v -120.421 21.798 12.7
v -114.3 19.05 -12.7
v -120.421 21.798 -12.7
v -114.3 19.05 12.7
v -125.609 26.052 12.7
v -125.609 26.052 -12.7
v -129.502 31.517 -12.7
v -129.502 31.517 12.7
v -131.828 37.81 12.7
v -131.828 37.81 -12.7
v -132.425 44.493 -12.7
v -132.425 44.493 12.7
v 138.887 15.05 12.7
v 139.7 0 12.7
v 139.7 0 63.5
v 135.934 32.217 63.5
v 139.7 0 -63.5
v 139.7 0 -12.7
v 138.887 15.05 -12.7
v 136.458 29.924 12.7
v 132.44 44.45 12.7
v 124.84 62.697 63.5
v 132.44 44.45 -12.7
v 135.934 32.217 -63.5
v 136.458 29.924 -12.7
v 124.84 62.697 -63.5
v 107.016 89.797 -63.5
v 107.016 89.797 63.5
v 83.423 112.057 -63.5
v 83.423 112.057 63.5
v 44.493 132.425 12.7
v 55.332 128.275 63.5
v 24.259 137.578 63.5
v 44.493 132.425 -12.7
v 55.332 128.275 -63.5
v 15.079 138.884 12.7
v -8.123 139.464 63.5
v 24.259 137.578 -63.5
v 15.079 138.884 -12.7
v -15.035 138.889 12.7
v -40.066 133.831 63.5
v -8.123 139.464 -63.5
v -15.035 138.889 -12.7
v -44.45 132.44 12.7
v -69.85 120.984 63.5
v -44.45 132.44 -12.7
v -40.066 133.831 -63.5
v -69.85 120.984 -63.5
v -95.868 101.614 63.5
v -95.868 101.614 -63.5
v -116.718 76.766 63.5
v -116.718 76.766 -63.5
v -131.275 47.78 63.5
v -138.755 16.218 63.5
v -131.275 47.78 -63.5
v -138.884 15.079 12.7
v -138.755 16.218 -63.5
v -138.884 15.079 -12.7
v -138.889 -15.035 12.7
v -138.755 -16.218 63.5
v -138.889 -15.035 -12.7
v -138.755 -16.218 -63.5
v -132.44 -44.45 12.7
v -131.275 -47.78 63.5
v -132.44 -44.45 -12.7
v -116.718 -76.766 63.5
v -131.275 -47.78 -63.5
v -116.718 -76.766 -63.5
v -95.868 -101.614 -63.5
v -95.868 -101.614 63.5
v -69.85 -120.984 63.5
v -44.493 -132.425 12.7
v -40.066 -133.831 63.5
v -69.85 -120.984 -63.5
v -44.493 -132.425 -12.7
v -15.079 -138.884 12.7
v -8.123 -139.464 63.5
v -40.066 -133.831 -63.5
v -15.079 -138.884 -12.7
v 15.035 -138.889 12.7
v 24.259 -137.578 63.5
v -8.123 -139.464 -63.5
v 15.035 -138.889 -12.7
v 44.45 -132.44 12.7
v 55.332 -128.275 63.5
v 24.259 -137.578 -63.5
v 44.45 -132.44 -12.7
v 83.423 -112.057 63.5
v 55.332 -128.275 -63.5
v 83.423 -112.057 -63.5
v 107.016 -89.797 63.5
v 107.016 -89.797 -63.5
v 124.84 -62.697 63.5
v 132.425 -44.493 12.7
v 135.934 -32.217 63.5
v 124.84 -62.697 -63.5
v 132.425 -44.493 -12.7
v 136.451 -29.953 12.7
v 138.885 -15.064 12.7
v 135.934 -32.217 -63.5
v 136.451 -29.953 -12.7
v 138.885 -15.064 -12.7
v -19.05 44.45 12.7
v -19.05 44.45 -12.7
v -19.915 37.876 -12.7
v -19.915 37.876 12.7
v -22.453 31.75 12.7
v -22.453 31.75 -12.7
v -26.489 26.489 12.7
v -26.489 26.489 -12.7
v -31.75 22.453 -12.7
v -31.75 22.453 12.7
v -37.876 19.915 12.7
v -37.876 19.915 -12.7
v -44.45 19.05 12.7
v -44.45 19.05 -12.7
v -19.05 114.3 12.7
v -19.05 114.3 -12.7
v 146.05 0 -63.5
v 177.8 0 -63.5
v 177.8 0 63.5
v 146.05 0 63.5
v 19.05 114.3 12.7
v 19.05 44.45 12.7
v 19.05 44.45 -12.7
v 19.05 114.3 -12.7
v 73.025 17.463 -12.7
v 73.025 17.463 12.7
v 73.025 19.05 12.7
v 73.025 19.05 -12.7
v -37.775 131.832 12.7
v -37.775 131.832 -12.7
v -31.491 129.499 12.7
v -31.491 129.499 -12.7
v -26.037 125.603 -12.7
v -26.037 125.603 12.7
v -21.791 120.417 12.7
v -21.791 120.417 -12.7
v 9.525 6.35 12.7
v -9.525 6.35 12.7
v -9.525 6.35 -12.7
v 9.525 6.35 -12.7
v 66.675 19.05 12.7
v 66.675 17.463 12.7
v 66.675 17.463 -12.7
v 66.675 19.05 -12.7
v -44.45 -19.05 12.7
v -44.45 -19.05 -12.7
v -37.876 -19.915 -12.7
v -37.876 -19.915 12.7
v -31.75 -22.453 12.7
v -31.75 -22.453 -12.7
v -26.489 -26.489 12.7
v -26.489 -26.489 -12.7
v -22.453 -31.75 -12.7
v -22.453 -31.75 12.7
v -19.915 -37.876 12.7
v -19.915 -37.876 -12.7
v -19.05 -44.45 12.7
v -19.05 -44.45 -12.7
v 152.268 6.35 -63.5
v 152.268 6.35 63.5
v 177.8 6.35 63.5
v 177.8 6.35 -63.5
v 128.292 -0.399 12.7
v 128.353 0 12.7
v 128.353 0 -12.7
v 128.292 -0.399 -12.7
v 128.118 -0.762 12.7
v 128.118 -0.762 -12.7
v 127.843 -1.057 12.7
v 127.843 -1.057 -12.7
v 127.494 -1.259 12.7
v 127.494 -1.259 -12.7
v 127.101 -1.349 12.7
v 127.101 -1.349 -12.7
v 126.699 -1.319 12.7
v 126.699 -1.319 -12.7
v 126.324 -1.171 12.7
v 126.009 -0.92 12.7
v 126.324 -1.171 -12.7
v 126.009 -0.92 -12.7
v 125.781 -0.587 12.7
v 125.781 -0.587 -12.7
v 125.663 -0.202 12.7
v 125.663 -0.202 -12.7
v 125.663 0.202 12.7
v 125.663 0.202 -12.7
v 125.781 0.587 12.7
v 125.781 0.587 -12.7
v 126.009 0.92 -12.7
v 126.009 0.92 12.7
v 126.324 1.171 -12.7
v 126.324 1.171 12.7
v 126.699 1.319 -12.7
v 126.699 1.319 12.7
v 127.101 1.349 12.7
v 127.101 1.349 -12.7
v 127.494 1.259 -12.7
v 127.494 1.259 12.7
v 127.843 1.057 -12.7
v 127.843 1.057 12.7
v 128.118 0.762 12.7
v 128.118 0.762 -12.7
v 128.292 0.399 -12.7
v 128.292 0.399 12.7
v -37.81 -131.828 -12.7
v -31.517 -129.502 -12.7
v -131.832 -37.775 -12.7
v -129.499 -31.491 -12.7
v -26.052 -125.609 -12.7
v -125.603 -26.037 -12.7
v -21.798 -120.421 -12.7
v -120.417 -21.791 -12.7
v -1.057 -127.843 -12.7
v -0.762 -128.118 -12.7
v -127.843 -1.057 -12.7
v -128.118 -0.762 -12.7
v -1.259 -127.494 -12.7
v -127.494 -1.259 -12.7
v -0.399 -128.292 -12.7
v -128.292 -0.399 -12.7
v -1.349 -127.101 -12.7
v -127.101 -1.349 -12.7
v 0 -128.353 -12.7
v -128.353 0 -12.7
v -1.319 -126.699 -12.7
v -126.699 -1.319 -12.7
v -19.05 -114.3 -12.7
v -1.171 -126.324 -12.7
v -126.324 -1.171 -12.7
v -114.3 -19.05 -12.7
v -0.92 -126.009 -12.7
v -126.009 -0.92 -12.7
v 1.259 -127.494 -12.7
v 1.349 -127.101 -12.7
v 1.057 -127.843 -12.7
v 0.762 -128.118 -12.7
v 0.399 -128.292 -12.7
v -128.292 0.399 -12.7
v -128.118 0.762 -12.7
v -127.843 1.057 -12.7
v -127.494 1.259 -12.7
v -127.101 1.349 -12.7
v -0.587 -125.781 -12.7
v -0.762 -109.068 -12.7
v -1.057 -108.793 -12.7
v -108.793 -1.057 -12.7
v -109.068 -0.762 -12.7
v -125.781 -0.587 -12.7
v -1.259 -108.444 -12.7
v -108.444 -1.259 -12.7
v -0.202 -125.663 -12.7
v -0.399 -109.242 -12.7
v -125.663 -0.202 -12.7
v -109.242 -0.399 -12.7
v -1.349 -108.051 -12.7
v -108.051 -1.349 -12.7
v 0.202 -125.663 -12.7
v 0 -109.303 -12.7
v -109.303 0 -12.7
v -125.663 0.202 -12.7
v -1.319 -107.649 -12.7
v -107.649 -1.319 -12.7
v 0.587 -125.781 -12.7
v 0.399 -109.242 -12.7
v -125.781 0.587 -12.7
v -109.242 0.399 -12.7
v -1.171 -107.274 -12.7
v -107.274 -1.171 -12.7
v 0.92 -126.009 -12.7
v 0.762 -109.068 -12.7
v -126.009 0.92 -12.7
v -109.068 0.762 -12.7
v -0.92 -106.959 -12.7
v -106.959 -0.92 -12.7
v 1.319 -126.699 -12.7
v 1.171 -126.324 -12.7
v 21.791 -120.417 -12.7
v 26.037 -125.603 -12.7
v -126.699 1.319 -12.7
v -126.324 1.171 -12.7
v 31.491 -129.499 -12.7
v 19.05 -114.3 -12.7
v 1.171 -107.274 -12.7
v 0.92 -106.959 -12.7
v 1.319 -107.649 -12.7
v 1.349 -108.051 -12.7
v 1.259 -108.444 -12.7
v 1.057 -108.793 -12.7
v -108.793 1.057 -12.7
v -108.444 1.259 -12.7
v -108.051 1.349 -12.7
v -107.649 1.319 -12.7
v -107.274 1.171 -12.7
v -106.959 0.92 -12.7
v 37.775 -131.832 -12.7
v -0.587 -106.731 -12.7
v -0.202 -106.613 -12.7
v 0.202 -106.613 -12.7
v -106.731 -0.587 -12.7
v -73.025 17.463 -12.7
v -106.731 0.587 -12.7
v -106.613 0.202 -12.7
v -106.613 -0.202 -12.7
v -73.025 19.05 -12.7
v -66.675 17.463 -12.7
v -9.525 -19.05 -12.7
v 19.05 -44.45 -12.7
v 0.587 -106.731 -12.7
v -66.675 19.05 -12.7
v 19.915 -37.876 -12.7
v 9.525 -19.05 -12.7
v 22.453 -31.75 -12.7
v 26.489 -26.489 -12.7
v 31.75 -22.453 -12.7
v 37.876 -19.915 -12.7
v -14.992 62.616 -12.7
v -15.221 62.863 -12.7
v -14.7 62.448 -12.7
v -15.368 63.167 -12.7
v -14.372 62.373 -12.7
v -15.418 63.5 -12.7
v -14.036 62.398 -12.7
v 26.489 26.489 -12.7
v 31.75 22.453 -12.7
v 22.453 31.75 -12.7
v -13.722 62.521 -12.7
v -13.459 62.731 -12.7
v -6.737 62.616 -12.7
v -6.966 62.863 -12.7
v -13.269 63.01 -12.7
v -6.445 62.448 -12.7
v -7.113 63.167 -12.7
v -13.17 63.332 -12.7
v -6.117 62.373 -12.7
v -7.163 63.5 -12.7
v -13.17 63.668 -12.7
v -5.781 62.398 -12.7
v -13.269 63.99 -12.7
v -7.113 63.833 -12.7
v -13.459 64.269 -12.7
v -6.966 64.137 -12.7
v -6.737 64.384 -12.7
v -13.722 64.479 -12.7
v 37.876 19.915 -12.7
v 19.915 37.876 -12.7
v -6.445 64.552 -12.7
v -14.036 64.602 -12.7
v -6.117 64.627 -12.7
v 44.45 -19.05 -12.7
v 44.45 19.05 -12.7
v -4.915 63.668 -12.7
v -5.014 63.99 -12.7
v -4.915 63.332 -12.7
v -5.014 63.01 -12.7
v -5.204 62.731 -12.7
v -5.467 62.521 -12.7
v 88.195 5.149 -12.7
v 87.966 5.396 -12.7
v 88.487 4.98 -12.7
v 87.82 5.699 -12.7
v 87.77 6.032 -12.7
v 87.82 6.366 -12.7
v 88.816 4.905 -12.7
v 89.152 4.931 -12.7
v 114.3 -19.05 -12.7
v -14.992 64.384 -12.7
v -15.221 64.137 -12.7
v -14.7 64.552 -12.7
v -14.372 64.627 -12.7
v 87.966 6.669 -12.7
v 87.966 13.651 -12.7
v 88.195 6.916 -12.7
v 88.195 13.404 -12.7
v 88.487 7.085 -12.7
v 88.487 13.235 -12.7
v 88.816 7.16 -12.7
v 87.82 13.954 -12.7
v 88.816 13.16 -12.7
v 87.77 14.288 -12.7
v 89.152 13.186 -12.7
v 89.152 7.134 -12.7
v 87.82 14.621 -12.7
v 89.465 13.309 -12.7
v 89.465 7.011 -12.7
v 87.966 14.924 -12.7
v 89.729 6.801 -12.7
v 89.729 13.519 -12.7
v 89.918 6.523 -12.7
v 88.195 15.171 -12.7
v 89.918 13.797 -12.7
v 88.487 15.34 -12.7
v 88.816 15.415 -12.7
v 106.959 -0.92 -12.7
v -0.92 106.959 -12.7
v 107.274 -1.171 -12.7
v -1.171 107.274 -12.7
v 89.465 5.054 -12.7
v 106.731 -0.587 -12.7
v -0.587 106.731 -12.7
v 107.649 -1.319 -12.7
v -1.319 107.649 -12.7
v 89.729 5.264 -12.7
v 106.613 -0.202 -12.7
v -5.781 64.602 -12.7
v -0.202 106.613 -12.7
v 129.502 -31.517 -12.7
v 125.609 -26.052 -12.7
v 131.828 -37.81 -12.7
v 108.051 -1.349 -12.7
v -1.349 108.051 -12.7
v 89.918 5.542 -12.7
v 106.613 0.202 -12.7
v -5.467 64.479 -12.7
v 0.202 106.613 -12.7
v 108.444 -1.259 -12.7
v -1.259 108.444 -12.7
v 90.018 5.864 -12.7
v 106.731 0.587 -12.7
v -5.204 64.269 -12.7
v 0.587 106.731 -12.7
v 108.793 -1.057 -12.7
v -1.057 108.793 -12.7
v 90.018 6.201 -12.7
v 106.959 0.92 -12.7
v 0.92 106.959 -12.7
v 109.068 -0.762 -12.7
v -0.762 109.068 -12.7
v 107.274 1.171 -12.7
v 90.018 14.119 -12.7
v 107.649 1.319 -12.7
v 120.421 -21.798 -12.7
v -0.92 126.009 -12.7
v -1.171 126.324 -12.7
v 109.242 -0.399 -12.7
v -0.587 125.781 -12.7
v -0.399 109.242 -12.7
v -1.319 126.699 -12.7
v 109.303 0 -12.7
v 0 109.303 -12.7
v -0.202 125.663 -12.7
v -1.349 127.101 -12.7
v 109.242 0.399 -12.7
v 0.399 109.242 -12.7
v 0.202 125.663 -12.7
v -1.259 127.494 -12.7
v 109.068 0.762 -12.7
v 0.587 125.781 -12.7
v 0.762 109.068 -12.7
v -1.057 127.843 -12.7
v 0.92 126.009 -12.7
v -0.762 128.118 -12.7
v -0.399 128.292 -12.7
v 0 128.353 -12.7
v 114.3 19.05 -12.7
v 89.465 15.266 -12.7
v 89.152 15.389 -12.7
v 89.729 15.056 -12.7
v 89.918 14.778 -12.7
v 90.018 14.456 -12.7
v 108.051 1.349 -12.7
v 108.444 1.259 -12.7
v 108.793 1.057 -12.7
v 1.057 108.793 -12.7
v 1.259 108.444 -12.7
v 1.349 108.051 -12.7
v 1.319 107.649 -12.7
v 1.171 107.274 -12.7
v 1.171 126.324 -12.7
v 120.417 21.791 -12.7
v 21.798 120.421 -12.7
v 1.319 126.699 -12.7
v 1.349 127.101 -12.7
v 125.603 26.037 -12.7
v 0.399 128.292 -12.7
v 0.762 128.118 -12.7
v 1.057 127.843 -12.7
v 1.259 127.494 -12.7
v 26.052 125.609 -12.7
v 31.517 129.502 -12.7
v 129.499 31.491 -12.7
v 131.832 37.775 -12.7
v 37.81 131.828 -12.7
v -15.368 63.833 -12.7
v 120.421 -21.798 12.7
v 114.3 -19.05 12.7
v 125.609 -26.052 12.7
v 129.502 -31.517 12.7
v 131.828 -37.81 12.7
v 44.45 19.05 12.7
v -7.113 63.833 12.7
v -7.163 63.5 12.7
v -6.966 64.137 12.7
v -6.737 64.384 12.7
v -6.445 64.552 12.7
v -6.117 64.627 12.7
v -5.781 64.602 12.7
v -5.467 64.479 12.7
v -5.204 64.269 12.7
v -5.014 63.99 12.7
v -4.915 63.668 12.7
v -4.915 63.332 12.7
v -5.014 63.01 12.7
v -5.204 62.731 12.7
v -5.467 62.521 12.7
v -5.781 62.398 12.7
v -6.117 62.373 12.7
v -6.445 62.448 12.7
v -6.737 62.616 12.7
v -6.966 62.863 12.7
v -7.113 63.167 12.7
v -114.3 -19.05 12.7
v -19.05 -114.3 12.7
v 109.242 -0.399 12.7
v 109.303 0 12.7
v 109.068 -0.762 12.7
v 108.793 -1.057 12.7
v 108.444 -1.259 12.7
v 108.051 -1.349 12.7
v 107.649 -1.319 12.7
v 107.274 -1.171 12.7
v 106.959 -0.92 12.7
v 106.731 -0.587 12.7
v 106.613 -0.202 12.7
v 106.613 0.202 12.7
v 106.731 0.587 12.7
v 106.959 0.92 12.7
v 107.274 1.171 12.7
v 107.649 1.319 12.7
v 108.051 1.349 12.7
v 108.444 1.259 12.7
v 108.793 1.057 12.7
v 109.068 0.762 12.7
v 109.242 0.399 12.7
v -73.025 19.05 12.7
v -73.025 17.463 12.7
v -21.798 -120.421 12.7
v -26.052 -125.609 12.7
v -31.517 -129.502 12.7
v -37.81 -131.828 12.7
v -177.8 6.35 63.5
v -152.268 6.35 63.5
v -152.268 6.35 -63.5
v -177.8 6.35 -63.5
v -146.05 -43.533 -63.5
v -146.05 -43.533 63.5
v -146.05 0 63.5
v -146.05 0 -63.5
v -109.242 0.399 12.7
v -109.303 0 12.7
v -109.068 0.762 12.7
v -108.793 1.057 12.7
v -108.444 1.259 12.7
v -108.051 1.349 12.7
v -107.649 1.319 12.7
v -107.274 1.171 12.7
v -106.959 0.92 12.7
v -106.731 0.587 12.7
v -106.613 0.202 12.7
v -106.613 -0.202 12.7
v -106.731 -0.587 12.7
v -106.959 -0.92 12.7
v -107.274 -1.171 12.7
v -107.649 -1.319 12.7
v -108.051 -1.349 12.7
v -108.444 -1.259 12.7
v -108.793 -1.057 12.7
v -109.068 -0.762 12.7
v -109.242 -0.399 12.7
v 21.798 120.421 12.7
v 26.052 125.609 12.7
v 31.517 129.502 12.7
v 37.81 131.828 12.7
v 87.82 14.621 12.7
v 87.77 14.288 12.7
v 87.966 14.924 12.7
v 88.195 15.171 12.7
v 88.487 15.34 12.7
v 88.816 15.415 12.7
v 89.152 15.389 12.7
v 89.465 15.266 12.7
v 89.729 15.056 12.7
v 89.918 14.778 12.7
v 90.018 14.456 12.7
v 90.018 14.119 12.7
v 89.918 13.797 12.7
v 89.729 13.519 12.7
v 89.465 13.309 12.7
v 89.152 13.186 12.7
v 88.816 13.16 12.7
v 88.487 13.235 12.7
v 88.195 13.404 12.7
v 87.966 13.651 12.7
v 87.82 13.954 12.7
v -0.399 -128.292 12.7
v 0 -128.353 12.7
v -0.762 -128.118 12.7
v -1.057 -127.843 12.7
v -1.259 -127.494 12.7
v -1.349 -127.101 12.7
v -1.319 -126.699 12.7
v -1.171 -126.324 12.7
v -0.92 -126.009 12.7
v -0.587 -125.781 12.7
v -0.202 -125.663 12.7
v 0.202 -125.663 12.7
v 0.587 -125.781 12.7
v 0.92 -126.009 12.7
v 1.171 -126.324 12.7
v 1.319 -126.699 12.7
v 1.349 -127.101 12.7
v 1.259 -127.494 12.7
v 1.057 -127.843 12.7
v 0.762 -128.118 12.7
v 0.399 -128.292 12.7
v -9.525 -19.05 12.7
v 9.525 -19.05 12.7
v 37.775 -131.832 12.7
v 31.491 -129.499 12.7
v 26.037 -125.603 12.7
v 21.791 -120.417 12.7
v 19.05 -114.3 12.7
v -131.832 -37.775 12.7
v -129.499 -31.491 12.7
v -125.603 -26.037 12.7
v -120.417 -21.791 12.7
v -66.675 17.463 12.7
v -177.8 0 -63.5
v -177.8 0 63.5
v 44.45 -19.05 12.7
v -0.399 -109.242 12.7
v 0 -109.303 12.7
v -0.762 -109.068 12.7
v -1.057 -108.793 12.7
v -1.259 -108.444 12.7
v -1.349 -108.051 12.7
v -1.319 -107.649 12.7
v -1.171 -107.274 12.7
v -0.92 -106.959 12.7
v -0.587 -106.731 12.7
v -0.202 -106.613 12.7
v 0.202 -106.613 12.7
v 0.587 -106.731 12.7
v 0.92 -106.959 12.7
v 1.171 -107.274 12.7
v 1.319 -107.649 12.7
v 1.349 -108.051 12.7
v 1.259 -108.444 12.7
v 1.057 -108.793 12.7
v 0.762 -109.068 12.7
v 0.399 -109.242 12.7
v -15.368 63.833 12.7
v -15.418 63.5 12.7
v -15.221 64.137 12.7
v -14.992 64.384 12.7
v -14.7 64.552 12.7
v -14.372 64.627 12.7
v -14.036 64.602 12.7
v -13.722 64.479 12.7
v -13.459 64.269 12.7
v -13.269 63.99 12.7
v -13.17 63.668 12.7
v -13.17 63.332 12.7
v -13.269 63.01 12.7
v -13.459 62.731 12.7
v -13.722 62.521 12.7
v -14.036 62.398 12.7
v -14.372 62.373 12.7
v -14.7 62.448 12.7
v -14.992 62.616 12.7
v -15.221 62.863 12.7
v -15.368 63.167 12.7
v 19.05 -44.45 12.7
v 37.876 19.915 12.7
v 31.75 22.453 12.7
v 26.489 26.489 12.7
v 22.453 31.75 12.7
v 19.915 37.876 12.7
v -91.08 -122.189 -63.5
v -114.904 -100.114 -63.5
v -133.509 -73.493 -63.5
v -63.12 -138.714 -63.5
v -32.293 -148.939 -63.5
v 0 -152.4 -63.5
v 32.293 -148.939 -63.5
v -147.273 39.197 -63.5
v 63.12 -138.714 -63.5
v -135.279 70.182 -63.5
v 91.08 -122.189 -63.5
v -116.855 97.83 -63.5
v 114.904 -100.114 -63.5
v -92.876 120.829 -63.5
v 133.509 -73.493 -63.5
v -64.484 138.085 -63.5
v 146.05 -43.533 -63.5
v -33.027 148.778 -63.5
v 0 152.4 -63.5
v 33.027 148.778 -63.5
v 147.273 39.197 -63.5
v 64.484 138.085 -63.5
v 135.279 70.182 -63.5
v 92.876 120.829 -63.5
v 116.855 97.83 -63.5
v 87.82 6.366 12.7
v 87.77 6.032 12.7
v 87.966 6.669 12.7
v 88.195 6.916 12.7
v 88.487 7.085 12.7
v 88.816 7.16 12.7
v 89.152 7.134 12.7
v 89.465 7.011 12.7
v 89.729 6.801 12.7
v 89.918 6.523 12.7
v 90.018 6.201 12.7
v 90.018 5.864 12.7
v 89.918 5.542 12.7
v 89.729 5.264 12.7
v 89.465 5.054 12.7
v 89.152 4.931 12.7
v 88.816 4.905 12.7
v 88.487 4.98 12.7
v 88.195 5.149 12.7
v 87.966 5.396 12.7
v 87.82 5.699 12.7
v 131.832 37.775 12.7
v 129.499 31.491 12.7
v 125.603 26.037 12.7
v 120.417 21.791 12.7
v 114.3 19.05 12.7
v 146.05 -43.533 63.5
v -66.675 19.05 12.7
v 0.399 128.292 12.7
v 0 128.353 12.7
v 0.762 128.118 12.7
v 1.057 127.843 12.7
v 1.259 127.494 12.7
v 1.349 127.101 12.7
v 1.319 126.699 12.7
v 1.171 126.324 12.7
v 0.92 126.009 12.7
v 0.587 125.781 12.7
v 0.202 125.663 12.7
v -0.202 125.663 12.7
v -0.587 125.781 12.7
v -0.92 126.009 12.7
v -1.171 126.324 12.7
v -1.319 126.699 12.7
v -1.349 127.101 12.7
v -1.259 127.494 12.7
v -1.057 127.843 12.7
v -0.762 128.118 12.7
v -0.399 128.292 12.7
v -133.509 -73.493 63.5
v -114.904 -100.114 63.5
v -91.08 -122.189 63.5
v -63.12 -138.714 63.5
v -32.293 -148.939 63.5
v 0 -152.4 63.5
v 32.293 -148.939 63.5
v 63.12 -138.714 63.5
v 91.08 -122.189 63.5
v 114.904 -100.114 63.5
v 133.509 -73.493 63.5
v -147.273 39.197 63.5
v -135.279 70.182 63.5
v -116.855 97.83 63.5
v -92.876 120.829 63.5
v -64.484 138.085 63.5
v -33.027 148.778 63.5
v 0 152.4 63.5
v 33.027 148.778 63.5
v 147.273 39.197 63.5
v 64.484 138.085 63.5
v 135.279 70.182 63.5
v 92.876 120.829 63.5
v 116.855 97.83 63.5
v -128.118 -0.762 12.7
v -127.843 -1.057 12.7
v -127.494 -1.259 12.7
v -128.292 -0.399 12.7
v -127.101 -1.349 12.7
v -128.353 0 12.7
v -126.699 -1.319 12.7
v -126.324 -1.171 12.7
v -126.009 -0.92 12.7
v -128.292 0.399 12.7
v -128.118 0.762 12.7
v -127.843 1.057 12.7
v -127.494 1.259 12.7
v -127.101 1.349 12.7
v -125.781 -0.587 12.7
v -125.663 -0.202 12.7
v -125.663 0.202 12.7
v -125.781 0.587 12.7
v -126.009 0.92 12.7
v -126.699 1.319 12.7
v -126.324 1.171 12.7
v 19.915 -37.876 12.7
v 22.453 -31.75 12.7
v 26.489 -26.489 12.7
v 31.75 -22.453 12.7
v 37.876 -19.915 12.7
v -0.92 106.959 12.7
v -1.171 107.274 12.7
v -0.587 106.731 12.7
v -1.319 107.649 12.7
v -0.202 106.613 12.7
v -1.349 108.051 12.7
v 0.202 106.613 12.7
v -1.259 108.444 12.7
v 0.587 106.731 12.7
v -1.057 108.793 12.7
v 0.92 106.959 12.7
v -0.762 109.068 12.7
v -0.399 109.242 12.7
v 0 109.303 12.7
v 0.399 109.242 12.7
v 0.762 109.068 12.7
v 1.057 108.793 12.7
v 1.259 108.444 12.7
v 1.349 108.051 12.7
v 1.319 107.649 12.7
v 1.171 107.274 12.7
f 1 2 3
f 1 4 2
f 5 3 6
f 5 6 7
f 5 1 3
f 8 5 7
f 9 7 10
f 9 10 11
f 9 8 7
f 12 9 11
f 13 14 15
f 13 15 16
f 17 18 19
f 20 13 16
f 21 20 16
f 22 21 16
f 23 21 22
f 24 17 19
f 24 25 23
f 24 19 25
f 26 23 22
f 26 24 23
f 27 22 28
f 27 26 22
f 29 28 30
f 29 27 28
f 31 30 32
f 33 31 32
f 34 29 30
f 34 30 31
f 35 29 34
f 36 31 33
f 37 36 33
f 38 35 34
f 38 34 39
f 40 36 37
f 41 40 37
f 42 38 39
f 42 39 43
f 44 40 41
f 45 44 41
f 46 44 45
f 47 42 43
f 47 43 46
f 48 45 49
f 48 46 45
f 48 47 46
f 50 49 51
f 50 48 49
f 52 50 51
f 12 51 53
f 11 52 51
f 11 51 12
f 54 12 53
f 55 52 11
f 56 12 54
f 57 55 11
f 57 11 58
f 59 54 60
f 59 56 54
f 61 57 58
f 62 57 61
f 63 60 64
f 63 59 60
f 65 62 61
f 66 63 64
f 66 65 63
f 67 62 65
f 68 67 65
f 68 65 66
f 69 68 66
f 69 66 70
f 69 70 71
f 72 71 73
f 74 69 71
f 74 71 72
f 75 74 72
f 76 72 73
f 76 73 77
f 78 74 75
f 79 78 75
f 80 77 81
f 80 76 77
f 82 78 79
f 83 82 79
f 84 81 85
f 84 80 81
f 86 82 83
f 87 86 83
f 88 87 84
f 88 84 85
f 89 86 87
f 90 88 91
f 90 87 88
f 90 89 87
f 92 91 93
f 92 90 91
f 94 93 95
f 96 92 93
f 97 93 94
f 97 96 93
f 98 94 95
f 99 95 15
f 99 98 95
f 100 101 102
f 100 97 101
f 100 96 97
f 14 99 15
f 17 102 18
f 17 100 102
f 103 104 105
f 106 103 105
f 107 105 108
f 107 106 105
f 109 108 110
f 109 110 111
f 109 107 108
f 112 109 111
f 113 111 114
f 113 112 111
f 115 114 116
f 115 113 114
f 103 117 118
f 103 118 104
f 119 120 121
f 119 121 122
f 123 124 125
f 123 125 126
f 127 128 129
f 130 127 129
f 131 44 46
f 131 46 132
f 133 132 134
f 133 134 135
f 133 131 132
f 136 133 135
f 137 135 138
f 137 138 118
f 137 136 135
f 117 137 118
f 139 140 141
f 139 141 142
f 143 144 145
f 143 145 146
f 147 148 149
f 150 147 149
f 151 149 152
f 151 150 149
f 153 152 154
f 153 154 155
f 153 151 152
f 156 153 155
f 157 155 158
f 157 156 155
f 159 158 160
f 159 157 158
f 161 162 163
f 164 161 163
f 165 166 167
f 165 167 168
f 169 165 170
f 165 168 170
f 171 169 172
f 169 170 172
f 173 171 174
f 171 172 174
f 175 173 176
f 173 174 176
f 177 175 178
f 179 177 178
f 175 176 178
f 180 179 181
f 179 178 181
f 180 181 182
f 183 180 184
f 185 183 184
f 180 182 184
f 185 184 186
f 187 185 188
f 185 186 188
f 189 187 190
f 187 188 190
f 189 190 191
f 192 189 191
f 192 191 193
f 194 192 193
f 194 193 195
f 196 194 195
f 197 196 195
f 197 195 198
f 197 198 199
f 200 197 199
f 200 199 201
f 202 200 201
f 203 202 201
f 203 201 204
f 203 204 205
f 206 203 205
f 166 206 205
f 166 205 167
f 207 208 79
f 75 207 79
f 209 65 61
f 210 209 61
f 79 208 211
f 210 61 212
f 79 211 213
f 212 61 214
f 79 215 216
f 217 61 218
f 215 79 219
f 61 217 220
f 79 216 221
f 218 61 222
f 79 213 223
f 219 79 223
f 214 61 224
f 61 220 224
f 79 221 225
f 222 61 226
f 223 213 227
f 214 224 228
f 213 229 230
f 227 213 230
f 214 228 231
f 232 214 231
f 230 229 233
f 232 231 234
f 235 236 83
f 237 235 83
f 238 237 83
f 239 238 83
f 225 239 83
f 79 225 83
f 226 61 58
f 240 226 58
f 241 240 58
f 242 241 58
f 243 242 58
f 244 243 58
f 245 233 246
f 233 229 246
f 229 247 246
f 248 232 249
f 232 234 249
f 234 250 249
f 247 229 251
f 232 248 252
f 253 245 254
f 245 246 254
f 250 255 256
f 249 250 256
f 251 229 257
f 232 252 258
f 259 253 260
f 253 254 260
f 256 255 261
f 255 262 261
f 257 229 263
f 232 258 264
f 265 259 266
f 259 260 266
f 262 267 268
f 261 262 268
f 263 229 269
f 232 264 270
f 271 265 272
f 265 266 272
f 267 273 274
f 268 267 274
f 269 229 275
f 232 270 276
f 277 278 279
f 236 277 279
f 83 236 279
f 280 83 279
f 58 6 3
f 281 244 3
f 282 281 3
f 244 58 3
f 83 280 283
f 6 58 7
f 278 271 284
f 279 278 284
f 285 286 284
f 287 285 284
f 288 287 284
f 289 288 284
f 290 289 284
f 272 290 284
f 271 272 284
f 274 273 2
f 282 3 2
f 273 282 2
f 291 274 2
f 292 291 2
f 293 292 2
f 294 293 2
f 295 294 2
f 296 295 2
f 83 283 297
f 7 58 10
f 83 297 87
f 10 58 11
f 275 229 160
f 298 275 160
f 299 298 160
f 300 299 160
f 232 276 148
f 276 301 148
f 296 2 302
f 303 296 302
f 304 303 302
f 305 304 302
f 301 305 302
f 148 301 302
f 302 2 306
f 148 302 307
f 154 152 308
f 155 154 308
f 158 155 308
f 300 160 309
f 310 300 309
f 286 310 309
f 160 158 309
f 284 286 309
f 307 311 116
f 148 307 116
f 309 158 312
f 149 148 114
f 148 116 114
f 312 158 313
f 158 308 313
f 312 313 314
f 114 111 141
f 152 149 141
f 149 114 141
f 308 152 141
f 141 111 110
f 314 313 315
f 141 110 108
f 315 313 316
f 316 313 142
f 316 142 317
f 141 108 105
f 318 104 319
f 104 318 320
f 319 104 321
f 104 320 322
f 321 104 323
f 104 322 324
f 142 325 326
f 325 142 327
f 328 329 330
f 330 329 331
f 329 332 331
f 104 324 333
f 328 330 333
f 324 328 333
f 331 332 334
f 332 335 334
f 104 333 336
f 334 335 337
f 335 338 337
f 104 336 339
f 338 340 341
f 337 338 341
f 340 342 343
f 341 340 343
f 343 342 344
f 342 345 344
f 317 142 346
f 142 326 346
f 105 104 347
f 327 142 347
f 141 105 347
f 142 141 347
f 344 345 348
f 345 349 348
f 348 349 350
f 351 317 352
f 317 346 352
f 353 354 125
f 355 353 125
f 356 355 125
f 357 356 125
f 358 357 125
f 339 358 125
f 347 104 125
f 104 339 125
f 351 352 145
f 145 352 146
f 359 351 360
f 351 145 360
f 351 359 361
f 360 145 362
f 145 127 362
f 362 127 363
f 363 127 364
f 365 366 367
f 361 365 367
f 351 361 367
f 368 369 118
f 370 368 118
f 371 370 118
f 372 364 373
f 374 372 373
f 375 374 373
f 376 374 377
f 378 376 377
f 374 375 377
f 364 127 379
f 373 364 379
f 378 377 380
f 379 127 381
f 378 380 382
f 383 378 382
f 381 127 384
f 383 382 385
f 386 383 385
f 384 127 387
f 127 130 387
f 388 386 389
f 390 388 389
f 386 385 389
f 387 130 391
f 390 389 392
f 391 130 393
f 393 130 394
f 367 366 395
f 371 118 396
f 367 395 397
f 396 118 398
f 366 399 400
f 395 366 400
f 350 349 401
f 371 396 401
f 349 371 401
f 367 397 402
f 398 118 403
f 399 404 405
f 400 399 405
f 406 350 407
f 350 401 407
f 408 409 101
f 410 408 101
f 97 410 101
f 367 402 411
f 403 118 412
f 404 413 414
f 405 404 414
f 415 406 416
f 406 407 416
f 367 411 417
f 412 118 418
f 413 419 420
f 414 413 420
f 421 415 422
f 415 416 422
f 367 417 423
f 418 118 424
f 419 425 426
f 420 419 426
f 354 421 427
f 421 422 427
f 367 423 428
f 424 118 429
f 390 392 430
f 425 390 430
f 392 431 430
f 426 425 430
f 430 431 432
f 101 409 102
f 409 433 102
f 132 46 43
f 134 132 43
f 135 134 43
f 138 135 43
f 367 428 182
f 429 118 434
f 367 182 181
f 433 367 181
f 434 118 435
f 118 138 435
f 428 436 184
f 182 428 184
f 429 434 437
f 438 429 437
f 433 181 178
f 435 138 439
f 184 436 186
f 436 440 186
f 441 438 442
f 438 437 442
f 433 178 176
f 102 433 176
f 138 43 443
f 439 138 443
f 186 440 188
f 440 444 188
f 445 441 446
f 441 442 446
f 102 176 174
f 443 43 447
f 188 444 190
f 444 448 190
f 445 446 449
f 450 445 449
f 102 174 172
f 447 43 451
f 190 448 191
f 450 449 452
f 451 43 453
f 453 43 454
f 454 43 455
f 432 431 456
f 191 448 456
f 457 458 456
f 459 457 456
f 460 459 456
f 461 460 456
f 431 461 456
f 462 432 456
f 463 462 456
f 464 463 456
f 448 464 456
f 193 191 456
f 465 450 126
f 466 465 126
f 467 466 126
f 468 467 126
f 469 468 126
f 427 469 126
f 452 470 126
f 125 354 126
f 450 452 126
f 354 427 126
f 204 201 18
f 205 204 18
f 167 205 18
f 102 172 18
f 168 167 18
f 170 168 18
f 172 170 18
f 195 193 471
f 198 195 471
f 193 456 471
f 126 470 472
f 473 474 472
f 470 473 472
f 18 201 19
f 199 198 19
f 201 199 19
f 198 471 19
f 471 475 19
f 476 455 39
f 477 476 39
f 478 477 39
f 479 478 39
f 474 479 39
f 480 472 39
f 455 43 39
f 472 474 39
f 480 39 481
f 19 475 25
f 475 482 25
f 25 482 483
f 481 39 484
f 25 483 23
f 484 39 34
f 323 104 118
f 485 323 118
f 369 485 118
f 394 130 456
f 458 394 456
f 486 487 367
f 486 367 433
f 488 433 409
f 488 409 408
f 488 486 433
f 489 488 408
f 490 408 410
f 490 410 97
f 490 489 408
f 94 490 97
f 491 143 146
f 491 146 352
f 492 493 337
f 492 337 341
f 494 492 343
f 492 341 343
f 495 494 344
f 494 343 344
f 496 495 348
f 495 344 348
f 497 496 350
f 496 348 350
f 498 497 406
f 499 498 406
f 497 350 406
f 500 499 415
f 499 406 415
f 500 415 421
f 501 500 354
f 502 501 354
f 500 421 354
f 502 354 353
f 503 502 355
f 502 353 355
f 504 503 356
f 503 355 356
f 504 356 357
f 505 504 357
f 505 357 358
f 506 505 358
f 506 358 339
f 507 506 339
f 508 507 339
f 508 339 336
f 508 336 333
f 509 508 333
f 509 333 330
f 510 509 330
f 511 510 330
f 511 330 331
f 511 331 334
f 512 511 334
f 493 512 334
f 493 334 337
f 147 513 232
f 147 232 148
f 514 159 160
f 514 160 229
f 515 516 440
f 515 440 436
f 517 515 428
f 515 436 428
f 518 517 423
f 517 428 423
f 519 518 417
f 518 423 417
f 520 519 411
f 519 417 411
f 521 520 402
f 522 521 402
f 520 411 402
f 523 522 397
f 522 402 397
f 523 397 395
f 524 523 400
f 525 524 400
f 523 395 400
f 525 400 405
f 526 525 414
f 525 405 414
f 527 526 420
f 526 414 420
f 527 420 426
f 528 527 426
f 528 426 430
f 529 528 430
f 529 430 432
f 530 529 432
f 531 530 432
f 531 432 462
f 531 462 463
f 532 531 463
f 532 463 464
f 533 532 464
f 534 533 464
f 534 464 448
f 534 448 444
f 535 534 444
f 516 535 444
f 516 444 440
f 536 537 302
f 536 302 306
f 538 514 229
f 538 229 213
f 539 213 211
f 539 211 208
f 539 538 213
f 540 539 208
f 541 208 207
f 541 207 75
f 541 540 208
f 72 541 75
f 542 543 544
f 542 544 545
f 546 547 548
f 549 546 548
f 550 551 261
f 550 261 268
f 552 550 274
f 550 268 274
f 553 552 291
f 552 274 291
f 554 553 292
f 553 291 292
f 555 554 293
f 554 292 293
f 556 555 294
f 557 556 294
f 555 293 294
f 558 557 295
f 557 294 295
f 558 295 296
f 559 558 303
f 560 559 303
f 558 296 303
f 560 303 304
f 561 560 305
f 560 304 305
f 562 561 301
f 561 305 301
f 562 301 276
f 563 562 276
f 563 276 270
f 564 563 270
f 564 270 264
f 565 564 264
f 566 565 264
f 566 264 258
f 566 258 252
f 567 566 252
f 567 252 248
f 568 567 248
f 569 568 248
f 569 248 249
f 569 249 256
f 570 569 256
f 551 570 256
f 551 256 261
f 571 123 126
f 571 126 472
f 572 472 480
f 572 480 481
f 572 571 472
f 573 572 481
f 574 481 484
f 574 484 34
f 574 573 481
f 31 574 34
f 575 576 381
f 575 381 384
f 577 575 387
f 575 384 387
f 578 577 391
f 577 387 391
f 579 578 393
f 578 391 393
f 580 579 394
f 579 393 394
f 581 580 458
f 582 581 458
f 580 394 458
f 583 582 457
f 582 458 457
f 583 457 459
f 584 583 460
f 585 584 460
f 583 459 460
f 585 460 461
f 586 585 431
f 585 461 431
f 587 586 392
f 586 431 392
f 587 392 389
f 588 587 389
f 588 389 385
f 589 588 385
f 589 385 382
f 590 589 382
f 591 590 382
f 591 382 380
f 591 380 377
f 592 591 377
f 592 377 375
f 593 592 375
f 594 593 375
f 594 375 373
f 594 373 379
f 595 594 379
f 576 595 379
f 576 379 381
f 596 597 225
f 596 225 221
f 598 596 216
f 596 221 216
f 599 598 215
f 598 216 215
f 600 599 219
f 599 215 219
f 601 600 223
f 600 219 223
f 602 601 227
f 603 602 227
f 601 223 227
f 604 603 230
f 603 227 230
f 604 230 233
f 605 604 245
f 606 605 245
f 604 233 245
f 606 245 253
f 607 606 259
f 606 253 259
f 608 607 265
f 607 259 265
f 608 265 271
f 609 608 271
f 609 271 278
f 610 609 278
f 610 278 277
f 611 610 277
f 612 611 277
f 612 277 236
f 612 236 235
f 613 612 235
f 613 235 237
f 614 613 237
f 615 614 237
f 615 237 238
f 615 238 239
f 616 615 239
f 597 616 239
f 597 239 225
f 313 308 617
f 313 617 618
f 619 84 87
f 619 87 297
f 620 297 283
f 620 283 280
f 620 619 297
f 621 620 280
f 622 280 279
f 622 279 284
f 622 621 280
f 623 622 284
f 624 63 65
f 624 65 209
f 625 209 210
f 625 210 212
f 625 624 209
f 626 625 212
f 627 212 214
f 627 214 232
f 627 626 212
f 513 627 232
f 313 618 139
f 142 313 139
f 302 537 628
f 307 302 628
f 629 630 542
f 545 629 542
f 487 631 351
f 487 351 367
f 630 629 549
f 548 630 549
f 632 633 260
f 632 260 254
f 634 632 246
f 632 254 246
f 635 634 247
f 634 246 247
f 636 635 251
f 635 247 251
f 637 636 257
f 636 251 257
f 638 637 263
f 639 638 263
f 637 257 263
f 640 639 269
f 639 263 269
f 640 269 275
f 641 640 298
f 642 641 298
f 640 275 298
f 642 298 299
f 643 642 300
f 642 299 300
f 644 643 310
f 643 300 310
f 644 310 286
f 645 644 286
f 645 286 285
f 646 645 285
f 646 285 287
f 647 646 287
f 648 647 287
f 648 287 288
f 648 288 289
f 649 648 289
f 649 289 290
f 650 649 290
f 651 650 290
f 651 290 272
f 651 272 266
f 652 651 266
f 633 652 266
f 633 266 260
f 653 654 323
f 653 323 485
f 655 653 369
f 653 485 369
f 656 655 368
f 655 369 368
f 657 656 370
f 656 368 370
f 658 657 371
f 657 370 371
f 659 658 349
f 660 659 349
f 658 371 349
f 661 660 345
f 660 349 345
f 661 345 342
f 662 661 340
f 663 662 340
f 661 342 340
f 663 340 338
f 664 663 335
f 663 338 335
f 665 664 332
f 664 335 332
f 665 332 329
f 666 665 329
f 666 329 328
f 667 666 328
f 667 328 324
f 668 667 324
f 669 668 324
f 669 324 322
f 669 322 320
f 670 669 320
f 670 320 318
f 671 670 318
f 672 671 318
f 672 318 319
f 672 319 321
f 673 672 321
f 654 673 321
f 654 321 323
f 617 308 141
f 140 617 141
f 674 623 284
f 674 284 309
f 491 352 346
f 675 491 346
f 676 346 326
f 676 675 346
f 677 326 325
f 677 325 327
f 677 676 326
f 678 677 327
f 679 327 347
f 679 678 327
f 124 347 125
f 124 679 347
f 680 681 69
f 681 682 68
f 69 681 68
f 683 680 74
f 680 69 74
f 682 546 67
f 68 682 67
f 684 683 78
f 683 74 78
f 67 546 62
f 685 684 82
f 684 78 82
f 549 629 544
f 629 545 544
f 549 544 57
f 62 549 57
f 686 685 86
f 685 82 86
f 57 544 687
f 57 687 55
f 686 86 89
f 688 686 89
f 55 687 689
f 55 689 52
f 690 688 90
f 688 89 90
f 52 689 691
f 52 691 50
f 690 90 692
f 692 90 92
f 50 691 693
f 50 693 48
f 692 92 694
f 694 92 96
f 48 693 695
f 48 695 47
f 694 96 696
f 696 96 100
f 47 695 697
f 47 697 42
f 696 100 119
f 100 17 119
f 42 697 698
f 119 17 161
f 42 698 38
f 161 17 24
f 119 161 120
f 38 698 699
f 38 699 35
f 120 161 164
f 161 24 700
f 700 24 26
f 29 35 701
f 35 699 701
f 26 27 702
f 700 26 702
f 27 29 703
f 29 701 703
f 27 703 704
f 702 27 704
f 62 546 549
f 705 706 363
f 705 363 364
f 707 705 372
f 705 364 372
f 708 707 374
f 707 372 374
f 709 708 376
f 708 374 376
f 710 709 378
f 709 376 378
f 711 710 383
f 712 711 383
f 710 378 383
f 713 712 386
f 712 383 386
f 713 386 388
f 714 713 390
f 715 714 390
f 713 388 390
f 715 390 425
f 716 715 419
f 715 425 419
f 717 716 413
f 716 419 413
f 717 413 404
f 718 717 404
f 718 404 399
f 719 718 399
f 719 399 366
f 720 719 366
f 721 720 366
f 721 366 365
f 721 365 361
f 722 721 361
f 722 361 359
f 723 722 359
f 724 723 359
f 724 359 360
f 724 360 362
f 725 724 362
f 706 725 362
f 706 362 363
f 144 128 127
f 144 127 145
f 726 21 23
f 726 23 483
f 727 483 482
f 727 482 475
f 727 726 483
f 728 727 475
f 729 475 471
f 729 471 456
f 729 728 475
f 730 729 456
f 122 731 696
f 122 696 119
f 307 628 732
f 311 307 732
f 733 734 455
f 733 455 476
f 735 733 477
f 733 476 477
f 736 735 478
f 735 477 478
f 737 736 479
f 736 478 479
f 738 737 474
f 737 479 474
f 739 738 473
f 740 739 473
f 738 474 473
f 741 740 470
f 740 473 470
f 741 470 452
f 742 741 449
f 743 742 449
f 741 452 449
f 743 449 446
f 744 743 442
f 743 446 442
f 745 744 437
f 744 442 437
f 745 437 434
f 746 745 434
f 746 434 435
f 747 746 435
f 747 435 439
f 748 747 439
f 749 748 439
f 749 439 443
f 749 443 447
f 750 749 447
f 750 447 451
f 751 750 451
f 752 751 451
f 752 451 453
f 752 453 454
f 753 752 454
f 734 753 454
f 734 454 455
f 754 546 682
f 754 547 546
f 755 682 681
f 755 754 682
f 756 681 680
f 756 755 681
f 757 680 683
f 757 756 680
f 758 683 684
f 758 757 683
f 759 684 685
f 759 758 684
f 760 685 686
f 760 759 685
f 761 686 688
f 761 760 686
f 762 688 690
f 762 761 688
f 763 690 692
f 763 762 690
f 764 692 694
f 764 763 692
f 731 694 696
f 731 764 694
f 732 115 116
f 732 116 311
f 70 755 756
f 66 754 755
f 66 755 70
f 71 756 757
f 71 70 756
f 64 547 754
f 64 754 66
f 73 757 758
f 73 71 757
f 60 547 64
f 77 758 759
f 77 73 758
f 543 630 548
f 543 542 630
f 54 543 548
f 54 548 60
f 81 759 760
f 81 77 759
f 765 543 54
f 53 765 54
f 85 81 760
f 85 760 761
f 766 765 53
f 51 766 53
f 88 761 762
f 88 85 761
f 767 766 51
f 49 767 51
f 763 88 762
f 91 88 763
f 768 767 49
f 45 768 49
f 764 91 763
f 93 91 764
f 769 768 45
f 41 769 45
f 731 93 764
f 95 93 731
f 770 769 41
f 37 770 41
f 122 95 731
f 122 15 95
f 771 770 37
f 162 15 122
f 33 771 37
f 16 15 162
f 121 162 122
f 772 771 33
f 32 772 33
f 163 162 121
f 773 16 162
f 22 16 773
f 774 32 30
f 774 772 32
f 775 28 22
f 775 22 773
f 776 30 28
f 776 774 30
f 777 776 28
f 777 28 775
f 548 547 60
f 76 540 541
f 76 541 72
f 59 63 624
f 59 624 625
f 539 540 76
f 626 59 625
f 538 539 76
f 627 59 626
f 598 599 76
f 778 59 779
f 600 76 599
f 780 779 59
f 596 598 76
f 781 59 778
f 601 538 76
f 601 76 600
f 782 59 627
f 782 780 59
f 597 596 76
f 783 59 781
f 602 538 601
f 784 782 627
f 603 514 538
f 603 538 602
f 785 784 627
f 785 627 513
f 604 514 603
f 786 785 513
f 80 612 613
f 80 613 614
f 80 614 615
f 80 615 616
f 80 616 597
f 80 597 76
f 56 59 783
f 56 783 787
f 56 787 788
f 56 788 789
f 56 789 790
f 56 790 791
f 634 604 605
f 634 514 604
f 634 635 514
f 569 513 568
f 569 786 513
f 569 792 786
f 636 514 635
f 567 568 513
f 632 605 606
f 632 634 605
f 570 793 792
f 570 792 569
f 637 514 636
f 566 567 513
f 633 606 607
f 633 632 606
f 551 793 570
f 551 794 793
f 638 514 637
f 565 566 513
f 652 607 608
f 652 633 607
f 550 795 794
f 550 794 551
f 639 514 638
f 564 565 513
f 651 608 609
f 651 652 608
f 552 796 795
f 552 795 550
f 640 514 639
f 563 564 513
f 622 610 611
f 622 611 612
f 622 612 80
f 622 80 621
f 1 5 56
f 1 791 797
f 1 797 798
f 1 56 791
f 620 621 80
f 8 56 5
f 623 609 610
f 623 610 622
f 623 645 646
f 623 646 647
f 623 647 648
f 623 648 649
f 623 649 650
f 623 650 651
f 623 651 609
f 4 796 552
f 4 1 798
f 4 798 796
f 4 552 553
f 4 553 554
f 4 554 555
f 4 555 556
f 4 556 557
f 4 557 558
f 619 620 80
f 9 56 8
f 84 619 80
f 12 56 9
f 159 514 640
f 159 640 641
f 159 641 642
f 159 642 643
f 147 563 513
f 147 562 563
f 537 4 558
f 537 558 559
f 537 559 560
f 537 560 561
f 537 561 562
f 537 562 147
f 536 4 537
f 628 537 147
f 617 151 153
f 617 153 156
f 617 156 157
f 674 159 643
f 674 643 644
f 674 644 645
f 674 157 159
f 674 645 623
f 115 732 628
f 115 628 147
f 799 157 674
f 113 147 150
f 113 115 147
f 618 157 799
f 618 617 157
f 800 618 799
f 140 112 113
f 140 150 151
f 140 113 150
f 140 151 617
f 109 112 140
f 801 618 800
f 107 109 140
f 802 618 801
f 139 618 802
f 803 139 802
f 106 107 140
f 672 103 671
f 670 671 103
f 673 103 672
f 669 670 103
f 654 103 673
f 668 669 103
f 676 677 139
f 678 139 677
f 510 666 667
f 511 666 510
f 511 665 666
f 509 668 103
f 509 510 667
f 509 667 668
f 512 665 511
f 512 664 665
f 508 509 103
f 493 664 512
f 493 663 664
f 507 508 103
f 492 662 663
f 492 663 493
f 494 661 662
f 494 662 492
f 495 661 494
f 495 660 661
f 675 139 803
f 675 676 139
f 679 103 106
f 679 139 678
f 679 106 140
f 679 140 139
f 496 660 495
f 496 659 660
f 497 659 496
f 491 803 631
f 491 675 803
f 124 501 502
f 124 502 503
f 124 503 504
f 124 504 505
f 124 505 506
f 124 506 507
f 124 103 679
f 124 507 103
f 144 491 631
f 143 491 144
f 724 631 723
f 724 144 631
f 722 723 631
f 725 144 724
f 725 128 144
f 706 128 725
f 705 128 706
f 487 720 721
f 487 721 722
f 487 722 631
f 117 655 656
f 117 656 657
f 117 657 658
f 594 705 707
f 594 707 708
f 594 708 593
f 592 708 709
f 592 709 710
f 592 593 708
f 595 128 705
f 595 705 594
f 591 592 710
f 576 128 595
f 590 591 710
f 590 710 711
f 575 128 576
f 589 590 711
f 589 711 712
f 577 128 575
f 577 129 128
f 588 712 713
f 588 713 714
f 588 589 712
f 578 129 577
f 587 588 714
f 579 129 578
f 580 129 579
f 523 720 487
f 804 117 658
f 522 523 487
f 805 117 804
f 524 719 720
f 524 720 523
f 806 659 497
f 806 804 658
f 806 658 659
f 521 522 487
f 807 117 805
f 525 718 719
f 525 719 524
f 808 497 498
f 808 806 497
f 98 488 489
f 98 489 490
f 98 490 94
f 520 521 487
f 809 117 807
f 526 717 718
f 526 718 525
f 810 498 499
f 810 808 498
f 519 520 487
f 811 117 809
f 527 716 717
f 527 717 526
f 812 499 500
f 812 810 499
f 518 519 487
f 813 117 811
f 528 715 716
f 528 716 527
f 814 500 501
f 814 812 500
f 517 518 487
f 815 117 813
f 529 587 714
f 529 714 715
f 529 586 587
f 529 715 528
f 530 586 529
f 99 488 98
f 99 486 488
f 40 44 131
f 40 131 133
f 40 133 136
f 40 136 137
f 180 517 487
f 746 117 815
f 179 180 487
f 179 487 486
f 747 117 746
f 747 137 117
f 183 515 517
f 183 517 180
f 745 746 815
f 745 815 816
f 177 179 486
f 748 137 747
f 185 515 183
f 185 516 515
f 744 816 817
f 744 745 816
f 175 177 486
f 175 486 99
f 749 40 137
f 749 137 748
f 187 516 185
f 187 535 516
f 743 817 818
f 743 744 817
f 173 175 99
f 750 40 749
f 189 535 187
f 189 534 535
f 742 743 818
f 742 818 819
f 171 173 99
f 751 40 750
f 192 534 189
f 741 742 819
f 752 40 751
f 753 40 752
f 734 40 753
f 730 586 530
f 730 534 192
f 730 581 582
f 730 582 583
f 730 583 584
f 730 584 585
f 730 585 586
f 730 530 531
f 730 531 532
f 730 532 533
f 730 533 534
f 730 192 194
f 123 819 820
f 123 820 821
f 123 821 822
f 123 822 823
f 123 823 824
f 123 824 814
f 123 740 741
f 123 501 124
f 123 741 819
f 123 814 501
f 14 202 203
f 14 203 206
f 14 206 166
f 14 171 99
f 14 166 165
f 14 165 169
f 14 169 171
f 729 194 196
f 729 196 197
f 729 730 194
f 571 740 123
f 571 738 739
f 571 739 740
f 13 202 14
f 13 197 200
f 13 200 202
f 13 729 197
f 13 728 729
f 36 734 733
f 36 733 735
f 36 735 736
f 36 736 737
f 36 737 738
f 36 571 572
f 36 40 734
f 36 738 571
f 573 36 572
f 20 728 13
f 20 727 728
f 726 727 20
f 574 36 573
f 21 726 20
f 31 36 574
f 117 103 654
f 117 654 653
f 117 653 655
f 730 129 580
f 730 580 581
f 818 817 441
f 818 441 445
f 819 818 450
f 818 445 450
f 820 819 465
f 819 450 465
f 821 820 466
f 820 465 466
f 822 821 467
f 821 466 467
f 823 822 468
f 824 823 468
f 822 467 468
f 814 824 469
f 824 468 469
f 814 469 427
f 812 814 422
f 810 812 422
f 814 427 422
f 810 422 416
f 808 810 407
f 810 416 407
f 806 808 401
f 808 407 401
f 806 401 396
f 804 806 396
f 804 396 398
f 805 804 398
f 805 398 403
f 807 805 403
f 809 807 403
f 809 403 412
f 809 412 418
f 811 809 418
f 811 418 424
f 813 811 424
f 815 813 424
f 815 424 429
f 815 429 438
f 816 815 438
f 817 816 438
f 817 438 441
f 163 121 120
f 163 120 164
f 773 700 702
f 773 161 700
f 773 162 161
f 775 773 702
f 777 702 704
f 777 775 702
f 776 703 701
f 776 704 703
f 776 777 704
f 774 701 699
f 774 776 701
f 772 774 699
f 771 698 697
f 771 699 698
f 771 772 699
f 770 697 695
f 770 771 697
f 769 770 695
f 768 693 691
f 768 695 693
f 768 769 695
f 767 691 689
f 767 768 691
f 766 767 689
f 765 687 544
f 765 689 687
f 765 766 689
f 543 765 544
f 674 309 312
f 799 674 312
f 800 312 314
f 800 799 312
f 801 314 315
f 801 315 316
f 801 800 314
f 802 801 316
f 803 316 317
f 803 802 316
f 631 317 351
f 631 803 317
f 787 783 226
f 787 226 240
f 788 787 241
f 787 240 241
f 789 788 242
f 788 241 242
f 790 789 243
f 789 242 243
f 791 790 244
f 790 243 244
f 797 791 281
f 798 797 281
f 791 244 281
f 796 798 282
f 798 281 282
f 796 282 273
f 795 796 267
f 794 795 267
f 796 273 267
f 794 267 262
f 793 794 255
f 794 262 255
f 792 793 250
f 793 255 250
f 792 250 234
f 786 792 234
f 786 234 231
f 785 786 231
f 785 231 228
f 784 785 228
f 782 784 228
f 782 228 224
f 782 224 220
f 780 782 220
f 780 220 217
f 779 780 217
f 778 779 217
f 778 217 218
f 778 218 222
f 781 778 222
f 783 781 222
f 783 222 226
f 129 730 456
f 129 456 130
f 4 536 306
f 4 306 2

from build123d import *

# Parameters (mm, degrees)
SKETCH1_R               = 152.4
SKETCH1_R_2             = 139.7
BOSS_EXTRUDE1_DEPTH     = 63.5
BOSS_EXTRUDE2_DEPTH     = 12.7
CUT_EXTRUDE3_DEPTH      = 225.685936365
CUT_EXTRUDE3_DEPTH_BACK = 225.685936365
SKETCH4_W               = 19.05
SKETCH4_H               = 19.05
SKETCH7_W               = 19.05
SKETCH7_H               = 6.35
CUT_EXTRUDE4_DEPTH      = 229.6
SKETCH8_W               = 17.202693119
SKETCH8_H               = 50.8
CUT_EXTRUDE5_DEPTH      = 251.160988166
SKETCH9_W               = 31.75
SKETCH9_H               = 6.35
BOSS_EXTRUDE3_DEPTH     = 127
SKETCH10_W              = 6.35
SKETCH10_H              = 1.5875
CUT_EXTRUDE6_DEPTH      = 247.262136757
F_4_40_TAPPED_HOLE1_D   = 2.2606
F_6_32_TAPPED_HOLE1_D   = 2.7051
CIRPATTERN1_COUNT       = 4


with BuildPart() as part:
    # Sketch1 → Boss-Extrude1 (new, symmetric)
    with BuildSketch(Plane.XY):
        Circle(SKETCH1_R)
        Circle(SKETCH1_R_2, mode=Mode.SUBTRACT)
    extrude(amount=BOSS_EXTRUDE1_DEPTH, both=True)

    # Sketch2 → Boss-Extrude2 (add, symmetric)
    with BuildSketch(Plane.XY):
        with BuildLine():
            ThreePointArc((-114.3, 19.05), (-127.736482233, 28.655491493), (-132.425396447, 44.492745205))
            Line((-132.425396447, 44.492745205), (-143.350279695, 19.05))
            Line((-143.350279695, 19.05), (-147.191797275, 19.05))
            Line((-147.191797275, 19.05), (-147.191797275, -19.05))
            Line((-147.191797275, -19.05), (-143.95681272, -19.05))
            Line((-143.95681272, -19.05), (-132.439750453, -44.45))
            ThreePointArc((-132.439750453, -44.45), (-127.731621931, -28.635000127), (-114.3, -19.05))
            Line((-114.3, -19.05), (-44.45, -19.05))
            ThreePointArc((-44.45, -19.05), (-26.489487758, -26.489487758), (-19.05, -44.45))
            Line((-19.05, -44.45), (-19.05, -114.3))
            ThreePointArc((-19.05, -114.3), (-28.655491493, -127.736482233), (-44.492745205, -132.425396447))
            Line((-44.492745205, -132.425396447), (-19.05, -143.350279695))
            Line((-19.05, -143.350279695), (-19.05, -143.95681272))
            Line((-19.05, -143.95681272), (19.05, -143.95681272))
            Line((19.05, -143.95681272), (44.45, -132.439750453))
            ThreePointArc((44.45, -132.439750453), (28.635000127, -127.731621931), (19.05, -114.3))
            Line((19.05, -114.3), (19.05, -44.45))
            ThreePointArc((19.05, -44.45), (26.489487758, -26.489487758), (44.45, -19.05))
            Line((44.45, -19.05), (114.3, -19.05))
            ThreePointArc((114.3, -19.05), (127.736482233, -28.655491493), (132.425396447, -44.492745205))
            Line((132.425396447, -44.492745205), (143.350279695, -19.05))
            Line((143.350279695, -19.05), (147.191797275, -19.05))
            Line((147.191797275, -19.05), (147.191797275, 19.05))
            Line((147.191797275, 19.05), (143.95681272, 19.05))
            Line((143.95681272, 19.05), (132.439750453, 44.45))
            ThreePointArc((132.439750453, 44.45), (127.731621931, 28.635000127), (114.3, 19.05))
            Line((114.3, 19.05), (44.45, 19.05))
            ThreePointArc((44.45, 19.05), (26.489487758, 26.489487758), (19.05, 44.45))
            Line((19.05, 44.45), (19.05, 114.3))
            ThreePointArc((19.05, 114.3), (28.655491493, 127.736482233), (44.492745205, 132.425396447))
            Line((44.492745205, 132.425396447), (19.05, 143.350279695))
            Line((19.05, 143.350279695), (19.05, 143.95681272))
            Line((19.05, 143.95681272), (-19.05, 143.95681272))
            Line((-19.05, 143.95681272), (-44.45, 132.439750453))
            ThreePointArc((-44.45, 132.439750453), (-28.635000127, 127.731621931), (-19.05, 114.3))
            Line((-19.05, 114.3), (-19.05, 44.45))
            ThreePointArc((-19.05, 44.45), (-26.489487758, 26.489487758), (-44.45, 19.05))
            Line((-44.45, 19.05), (-114.3, 19.05))
        make_face()
    extrude(amount=BOSS_EXTRUDE2_DEPTH, both=True)

    # Sketch4 → Cut-Extrude3 (cut, two sides: drawn at the far end of the back side and taken through both)
    with BuildSketch(Plane.XY.offset(-CUT_EXTRUDE3_DEPTH_BACK)):
        with Locations((0, -9.525)):
            Rectangle(SKETCH4_W, SKETCH4_H)
    extrude(amount=CUT_EXTRUDE3_DEPTH + CUT_EXTRUDE3_DEPTH_BACK, mode=Mode.SUBTRACT)

    # Sketch7 → Cut-Extrude4 (cut, through all)
    with BuildSketch(Plane.XY.offset(12.7)):
        with Locations((0, 3.175)):
            Rectangle(SKETCH7_W, SKETCH7_H)
    extrude(amount=-CUT_EXTRUDE4_DEPTH, mode=Mode.SUBTRACT)

    # Sketch8 → Cut-Extrude5 (cut, through all)
    with BuildSketch(Plane.XY.offset(63.5)):
        with Locations((-154.65134656, -25.4)):
            Rectangle(SKETCH8_W, SKETCH8_H)
    cut_extrude5 = extrude(amount=-CUT_EXTRUDE5_DEPTH, mode=Mode.SUBTRACT)

    # Mirror1: Cut-Extrude5 across plane
    add(cut_extrude5.mirror(Plane(origin=(0, 0, 0), x_dir=(0, 0, 1), z_dir=(1, 0, 0))), mode=Mode.SUBTRACT)

    # Sketch9 → Boss-Extrude3 (add)
    with BuildSketch(Plane.XY.offset(63.5)):
        with Locations((161.925, 3.175)):
            Rectangle(SKETCH9_W, SKETCH9_H)
    boss_extrude3 = extrude(amount=-BOSS_EXTRUDE3_DEPTH)

    # Mirror2: Boss-Extrude3 across plane
    add(boss_extrude3.mirror(Plane(origin=(0, 0, 0), x_dir=(0, 0, 1), z_dir=(1, 0, 0))))

    # Sketch10 → Cut-Extrude6 (cut, through all)
    with BuildSketch(Plane.XY.offset(12.7)):
        with Locations((-69.85, 18.25625)):
            Rectangle(SKETCH10_W, SKETCH10_H)
    cut_extrude6 = extrude(amount=-CUT_EXTRUDE6_DEPTH, mode=Mode.SUBTRACT)

    # Mirror3: Cut-Extrude6 across plane
    add(cut_extrude6.mirror(Plane(origin=(0, 0, 0), x_dir=(0, 0, 1), z_dir=(1, 0, 0))), mode=Mode.SUBTRACT)

    # #4-40 Tapped Hole1 (through all)
    with Locations(Plane.XY.offset(12.7)):
        with Locations((-14.2875, 63.5), (-6.0325, 63.5), (88.9, 14.2875), (88.9, 6.0325)):
            Hole(F_4_40_TAPPED_HOLE1_D / 2)

    # #6-32 Tapped Hole1 (through all)
    with Locations(Plane.XY.offset(12.7)):
        with Locations((-107.95, 0), (-127, 0)):
            f_6_32_tapped_hole1 = Hole(F_6_32_TAPPED_HOLE1_D / 2)

    # CirPattern1: #6-32 Tapped Hole1 ×4 about axis
    cirpattern1_axis = Axis((0, 0, 0), (0, 0, 1))
    for i in range(1, CIRPATTERN1_COUNT):
        add(f_6_32_tapped_hole1.rotate(cirpattern1_axis, i * 360 / CIRPATTERN1_COUNT), mode=Mode.SUBTRACT)


solid = part.part
